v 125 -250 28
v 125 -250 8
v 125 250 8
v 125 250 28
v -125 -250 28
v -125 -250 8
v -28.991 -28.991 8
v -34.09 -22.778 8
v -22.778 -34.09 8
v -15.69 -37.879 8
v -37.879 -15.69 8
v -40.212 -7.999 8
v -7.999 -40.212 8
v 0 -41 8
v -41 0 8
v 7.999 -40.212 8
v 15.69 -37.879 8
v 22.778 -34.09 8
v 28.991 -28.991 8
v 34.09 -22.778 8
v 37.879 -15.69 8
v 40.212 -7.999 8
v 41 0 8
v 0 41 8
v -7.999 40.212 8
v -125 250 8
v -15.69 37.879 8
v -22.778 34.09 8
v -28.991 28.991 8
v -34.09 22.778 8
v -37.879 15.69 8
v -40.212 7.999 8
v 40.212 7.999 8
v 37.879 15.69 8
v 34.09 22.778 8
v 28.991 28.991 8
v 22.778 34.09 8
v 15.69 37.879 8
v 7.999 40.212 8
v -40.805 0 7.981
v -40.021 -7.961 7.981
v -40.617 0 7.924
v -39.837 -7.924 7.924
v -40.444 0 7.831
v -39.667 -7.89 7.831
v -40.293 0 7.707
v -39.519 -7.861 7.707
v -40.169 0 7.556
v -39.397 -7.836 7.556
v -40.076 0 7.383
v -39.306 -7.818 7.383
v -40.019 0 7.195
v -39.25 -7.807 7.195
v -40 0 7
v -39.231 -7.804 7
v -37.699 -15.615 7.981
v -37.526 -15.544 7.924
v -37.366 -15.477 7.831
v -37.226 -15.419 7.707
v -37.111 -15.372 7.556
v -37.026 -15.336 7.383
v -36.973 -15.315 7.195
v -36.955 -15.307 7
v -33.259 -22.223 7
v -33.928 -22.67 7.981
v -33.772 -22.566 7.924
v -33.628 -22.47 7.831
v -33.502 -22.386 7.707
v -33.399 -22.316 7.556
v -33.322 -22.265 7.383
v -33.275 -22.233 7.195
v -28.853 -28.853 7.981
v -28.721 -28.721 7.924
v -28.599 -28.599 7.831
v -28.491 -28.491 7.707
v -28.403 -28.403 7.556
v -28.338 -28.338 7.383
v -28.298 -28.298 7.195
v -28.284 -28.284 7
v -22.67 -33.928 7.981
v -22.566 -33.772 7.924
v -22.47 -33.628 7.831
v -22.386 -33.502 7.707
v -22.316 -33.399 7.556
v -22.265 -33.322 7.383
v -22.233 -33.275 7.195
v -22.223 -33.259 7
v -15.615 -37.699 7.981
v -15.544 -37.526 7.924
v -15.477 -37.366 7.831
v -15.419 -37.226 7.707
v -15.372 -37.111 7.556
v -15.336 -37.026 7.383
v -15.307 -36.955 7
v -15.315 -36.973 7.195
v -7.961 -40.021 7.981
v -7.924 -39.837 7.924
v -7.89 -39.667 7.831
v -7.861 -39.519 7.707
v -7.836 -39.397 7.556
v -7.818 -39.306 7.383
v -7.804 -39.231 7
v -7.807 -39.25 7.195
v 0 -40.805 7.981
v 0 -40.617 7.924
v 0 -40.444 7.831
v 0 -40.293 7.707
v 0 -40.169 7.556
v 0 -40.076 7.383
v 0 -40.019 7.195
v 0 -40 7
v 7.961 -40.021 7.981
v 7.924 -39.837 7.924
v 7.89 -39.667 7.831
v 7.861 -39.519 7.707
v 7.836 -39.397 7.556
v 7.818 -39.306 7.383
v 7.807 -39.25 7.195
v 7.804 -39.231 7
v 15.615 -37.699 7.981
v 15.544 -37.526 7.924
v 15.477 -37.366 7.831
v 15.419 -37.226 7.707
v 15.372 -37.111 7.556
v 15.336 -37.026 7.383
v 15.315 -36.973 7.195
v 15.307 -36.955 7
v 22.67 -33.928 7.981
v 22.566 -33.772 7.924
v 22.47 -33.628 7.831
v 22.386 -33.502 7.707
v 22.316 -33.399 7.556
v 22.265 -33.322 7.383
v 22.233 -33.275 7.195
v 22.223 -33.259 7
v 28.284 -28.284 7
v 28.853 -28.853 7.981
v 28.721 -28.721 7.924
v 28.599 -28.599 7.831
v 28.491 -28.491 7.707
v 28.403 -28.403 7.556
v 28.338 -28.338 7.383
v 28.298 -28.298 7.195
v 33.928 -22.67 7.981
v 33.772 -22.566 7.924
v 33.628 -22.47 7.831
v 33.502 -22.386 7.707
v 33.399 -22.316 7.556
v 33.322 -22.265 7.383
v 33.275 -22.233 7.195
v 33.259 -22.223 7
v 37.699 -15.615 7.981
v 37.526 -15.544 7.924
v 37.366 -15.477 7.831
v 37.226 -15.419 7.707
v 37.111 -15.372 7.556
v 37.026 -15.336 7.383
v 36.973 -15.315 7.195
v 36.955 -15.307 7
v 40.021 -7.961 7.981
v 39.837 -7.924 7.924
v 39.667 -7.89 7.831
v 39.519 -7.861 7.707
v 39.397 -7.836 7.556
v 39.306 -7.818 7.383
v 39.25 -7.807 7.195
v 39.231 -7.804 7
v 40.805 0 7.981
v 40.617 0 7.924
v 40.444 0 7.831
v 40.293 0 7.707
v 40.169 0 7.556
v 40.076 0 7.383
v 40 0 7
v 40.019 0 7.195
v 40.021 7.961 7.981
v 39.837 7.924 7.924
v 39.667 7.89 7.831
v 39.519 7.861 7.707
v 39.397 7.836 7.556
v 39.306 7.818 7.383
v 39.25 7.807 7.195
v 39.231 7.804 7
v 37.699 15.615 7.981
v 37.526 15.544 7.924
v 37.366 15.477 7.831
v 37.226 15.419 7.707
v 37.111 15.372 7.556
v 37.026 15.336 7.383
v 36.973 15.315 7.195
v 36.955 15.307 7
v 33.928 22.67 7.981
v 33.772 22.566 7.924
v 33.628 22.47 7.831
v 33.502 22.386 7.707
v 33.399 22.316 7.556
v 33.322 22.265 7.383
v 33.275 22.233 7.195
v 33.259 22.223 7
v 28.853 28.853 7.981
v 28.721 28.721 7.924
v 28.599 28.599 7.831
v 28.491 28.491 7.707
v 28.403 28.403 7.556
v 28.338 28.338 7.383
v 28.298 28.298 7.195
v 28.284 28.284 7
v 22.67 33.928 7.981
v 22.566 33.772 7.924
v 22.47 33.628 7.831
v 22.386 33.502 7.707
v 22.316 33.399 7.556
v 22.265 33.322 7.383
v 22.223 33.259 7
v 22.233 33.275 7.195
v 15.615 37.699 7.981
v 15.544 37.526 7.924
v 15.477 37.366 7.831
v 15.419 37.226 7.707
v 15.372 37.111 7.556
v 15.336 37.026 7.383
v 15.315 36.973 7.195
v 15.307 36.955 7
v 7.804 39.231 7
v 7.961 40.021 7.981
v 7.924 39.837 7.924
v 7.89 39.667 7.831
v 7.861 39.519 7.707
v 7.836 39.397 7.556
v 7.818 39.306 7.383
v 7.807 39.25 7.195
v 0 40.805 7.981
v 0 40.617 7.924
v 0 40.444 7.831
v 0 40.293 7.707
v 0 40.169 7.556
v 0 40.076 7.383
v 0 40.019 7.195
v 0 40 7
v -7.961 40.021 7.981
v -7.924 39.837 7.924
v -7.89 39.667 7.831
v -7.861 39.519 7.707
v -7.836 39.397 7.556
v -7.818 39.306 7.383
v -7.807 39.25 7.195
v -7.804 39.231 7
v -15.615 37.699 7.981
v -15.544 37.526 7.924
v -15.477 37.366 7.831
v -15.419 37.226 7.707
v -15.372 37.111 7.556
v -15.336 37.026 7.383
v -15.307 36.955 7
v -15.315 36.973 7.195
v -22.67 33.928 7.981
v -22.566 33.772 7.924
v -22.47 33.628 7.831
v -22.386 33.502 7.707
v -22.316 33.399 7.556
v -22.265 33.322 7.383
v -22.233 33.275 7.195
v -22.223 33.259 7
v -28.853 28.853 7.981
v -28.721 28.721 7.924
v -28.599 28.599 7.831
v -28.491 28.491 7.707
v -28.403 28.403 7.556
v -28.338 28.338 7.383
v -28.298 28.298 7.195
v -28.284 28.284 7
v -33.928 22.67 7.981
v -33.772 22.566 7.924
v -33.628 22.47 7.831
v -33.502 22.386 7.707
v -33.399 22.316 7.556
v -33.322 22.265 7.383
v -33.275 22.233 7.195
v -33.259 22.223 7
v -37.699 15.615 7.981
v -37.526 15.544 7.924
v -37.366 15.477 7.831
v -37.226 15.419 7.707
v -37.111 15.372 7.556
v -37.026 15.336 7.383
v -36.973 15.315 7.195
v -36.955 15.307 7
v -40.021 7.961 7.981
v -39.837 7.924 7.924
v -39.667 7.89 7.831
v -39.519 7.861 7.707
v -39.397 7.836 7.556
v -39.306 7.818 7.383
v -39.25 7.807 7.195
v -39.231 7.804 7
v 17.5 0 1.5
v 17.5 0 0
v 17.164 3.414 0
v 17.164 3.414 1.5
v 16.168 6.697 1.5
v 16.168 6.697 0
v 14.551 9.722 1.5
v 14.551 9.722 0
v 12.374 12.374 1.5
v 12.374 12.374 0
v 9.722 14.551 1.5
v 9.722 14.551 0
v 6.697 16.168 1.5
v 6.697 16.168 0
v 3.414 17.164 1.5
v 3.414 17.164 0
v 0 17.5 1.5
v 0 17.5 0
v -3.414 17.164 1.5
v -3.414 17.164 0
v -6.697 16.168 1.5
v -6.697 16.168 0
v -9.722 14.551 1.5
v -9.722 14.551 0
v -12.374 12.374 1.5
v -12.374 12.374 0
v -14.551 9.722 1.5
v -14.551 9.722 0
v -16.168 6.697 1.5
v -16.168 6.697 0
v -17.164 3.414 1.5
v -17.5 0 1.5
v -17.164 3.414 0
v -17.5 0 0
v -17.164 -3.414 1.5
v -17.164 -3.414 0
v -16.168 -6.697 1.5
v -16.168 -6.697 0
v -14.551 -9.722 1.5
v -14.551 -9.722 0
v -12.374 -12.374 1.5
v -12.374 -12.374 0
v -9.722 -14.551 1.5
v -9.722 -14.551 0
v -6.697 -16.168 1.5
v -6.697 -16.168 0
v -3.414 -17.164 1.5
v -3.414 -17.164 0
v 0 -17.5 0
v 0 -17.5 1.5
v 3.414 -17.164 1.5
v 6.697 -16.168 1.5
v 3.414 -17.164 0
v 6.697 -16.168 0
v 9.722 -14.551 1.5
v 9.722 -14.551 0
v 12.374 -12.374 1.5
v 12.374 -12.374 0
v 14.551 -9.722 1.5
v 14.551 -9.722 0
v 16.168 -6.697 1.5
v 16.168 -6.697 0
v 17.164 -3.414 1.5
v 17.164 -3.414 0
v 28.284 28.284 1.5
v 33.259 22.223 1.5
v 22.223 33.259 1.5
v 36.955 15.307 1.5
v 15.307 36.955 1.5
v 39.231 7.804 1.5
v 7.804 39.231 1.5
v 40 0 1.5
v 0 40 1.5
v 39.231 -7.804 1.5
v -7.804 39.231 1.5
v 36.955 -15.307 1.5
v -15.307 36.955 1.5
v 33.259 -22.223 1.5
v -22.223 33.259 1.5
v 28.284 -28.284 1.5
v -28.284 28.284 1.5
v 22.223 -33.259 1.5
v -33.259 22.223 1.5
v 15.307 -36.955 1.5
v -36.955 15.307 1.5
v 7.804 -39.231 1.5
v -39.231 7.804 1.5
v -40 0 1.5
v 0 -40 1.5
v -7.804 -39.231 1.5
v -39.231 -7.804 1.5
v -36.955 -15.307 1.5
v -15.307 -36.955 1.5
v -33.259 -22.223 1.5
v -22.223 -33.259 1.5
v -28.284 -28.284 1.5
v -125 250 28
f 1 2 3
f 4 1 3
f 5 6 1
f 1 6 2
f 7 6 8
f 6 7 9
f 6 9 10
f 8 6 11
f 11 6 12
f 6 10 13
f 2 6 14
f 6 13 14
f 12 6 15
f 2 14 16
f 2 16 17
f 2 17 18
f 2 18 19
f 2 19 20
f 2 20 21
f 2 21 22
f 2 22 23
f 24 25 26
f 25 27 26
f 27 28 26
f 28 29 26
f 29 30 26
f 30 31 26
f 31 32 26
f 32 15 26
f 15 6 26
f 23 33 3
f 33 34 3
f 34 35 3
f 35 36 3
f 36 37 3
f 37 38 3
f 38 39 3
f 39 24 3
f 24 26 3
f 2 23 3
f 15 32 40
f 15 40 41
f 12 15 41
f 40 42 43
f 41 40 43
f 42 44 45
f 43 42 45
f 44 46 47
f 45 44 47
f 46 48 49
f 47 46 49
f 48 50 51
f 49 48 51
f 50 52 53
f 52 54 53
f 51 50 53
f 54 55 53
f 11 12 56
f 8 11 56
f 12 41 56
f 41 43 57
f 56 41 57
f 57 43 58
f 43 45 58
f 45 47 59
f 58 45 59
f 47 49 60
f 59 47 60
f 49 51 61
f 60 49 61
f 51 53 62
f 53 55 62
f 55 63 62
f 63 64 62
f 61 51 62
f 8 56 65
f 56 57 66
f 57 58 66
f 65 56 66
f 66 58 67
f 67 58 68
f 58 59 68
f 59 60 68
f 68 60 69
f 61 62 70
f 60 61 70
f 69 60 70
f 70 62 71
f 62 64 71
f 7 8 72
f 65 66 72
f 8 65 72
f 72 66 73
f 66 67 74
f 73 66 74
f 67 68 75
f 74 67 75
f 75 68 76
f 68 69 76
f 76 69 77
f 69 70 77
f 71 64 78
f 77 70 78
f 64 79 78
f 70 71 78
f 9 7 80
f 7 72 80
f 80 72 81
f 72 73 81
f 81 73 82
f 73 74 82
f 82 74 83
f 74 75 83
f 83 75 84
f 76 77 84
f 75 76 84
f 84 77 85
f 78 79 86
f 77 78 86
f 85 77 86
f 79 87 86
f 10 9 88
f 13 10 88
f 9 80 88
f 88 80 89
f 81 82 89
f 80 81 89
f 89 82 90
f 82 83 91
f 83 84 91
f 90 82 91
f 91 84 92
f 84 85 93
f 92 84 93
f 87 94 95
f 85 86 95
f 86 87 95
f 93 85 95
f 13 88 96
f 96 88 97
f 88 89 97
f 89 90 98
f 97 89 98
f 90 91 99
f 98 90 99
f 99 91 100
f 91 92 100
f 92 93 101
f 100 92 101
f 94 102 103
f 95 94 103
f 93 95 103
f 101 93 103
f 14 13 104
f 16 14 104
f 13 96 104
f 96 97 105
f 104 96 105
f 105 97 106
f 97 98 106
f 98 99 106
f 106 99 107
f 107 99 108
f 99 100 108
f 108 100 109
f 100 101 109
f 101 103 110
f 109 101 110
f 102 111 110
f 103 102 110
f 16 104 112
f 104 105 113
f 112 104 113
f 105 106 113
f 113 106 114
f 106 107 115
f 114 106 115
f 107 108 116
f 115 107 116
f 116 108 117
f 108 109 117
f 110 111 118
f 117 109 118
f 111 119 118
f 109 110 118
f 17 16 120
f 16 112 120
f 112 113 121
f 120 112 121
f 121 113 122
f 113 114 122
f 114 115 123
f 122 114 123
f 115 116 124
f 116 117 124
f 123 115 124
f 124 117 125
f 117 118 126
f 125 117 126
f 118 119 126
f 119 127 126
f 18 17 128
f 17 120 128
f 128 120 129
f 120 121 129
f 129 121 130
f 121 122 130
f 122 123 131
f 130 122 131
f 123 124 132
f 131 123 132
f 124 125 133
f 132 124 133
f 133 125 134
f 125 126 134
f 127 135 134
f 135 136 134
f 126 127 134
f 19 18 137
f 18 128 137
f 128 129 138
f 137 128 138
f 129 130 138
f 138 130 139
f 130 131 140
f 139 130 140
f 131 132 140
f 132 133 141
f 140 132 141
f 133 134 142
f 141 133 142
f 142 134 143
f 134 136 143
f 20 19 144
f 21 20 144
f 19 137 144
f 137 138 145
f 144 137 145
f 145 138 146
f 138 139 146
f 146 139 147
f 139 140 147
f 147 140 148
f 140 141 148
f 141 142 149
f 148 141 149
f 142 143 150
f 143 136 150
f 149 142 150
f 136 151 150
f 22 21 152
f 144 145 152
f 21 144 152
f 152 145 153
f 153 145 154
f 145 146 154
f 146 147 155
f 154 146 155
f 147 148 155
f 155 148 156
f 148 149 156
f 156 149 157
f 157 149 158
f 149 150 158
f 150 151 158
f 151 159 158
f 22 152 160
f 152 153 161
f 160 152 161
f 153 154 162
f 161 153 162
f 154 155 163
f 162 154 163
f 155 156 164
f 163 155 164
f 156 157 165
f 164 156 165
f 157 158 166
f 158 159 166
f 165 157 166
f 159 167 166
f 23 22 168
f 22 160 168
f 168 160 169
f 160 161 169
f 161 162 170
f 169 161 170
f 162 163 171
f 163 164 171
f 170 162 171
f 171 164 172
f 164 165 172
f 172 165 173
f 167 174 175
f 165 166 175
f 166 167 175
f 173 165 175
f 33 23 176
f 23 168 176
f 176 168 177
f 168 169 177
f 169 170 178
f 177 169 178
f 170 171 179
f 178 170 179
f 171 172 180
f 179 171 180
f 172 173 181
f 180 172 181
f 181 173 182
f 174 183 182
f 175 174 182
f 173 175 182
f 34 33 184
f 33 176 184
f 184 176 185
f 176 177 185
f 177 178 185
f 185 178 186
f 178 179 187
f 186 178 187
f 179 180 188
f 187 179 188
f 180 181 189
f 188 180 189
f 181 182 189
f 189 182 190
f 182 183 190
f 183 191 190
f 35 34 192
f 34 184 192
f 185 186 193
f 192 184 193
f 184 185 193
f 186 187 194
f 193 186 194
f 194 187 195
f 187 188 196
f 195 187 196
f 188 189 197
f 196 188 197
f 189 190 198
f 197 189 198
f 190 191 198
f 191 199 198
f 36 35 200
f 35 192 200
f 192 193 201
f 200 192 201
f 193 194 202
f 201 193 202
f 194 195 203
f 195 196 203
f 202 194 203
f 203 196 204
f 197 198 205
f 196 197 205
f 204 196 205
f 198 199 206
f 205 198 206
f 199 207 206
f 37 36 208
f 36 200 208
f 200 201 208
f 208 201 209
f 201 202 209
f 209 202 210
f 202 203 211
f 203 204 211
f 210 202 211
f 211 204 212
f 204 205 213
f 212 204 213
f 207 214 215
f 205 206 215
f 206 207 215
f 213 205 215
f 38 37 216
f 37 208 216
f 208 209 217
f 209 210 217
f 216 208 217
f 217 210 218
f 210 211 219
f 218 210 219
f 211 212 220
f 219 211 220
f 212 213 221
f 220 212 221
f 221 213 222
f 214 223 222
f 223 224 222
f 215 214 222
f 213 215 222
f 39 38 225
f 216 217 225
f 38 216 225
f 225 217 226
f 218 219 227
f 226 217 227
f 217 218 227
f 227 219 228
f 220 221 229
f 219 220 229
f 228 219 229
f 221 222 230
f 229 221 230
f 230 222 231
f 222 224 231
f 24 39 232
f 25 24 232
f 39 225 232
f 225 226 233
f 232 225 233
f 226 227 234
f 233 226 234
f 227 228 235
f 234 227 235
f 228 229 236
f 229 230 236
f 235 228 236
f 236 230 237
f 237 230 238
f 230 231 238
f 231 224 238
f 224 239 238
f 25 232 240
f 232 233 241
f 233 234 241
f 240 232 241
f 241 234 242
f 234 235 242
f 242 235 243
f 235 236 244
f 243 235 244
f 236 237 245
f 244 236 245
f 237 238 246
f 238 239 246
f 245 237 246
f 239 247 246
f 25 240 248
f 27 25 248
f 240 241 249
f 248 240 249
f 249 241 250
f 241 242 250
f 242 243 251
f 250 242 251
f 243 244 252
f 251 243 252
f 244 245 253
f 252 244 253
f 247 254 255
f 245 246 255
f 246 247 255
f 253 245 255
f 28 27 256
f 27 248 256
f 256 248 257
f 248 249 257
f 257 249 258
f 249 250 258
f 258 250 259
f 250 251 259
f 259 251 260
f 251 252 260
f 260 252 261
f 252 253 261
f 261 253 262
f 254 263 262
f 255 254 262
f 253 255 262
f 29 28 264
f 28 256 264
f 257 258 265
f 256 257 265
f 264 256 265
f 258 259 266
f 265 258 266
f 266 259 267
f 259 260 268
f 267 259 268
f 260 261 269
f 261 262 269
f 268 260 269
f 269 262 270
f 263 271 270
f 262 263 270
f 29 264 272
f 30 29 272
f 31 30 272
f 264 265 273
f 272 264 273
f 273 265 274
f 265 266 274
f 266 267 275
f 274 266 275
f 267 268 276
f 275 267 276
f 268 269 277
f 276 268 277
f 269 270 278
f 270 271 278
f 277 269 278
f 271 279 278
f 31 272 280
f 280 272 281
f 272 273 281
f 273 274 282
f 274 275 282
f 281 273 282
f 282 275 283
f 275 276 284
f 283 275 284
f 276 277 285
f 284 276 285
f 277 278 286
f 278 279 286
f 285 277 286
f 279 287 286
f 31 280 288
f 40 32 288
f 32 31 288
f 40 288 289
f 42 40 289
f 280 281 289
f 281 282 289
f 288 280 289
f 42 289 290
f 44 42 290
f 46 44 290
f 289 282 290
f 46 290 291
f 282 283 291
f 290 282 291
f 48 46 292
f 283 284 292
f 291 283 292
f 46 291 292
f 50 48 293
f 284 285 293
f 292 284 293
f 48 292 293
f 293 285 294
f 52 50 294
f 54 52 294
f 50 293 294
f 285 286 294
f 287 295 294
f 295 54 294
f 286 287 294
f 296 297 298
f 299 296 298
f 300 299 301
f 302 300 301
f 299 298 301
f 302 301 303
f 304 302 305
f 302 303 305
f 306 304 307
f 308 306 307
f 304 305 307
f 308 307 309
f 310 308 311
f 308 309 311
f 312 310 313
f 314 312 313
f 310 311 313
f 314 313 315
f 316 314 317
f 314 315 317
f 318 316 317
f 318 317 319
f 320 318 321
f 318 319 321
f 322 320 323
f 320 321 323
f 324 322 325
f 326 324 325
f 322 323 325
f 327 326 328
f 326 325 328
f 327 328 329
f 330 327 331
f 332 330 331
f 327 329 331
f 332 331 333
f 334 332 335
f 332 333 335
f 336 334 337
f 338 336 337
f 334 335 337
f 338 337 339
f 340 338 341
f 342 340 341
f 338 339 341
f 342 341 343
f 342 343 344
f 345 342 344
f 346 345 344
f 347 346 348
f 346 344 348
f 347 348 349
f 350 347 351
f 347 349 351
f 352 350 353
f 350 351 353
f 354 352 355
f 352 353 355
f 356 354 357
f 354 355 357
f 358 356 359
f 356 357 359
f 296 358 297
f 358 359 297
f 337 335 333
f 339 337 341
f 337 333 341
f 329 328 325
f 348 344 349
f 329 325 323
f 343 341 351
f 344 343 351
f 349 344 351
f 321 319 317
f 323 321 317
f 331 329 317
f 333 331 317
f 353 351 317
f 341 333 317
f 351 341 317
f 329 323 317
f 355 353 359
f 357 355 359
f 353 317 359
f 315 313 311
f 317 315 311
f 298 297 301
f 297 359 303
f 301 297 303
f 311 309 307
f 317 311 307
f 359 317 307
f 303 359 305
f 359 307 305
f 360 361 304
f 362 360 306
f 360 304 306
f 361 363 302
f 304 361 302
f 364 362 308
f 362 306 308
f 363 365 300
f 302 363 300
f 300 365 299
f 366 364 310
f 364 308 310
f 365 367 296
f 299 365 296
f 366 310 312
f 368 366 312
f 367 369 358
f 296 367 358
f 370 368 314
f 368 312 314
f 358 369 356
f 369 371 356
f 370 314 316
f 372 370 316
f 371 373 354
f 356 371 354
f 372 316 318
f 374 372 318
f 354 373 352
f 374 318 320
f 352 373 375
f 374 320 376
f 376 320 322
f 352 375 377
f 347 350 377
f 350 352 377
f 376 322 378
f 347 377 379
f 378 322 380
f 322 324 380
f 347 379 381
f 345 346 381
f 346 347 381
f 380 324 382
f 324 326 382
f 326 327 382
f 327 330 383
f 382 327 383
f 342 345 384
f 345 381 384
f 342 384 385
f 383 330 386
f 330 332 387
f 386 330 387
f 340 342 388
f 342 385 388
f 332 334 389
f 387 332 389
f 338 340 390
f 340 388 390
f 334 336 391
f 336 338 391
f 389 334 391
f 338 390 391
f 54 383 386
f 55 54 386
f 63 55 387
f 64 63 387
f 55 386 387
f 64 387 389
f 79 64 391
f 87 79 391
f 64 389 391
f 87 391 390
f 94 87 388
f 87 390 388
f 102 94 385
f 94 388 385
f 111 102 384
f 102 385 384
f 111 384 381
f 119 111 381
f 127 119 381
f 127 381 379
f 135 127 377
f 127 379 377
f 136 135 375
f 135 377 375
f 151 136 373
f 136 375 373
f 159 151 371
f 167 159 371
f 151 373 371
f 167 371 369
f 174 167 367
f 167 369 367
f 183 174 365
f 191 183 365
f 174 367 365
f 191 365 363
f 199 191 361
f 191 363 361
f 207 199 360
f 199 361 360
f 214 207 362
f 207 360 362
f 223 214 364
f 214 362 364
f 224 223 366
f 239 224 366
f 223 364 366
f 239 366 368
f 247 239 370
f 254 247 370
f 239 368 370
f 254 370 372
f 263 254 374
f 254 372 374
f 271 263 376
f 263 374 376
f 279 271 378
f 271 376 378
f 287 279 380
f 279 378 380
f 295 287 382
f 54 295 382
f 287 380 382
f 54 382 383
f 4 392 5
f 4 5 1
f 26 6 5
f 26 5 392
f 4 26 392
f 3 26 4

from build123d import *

# Parameters (mm, degrees)
SKETCH1_R           = 17.5
BOSS_EXTRUDE1_DEPTH = 1.5
SKETCH2_R           = 40
BOSS_EXTRUDE2_DEPTH = 6.5
SKETCH3_W           = 250
SKETCH3_H           = 500
BOSS_EXTRUDE3_DEPTH = 20
FILLET2_R           = 1


with BuildPart() as part:
    # Sketch1 → Boss-Extrude1 (new body)
    with BuildSketch(Plane.XY):
        Circle(SKETCH1_R)
    extrude(amount=BOSS_EXTRUDE1_DEPTH)

    # Sketch2 → Boss-Extrude2 (add)
    with BuildSketch(Plane.XY.offset(1.5)):
        with Locations(Location((0, 0, 0), (0, 0, 180))):
            Circle(SKETCH2_R)
    extrude(amount=BOSS_EXTRUDE2_DEPTH)

    # Sketch3 → Boss-Extrude3 (add)
    with BuildSketch(Plane.XY.offset(8)):
        Rectangle(SKETCH3_W, SKETCH3_H)
    extrude(amount=BOSS_EXTRUDE3_DEPTH)

    # Fillet2
    fillet2_edges = [part.edges().sort_by_distance(p)[0] for p in [
        (40, 0, 8),
    ]]
    fillet(fillet2_edges, radius=FILLET2_R)


solid = part.part
